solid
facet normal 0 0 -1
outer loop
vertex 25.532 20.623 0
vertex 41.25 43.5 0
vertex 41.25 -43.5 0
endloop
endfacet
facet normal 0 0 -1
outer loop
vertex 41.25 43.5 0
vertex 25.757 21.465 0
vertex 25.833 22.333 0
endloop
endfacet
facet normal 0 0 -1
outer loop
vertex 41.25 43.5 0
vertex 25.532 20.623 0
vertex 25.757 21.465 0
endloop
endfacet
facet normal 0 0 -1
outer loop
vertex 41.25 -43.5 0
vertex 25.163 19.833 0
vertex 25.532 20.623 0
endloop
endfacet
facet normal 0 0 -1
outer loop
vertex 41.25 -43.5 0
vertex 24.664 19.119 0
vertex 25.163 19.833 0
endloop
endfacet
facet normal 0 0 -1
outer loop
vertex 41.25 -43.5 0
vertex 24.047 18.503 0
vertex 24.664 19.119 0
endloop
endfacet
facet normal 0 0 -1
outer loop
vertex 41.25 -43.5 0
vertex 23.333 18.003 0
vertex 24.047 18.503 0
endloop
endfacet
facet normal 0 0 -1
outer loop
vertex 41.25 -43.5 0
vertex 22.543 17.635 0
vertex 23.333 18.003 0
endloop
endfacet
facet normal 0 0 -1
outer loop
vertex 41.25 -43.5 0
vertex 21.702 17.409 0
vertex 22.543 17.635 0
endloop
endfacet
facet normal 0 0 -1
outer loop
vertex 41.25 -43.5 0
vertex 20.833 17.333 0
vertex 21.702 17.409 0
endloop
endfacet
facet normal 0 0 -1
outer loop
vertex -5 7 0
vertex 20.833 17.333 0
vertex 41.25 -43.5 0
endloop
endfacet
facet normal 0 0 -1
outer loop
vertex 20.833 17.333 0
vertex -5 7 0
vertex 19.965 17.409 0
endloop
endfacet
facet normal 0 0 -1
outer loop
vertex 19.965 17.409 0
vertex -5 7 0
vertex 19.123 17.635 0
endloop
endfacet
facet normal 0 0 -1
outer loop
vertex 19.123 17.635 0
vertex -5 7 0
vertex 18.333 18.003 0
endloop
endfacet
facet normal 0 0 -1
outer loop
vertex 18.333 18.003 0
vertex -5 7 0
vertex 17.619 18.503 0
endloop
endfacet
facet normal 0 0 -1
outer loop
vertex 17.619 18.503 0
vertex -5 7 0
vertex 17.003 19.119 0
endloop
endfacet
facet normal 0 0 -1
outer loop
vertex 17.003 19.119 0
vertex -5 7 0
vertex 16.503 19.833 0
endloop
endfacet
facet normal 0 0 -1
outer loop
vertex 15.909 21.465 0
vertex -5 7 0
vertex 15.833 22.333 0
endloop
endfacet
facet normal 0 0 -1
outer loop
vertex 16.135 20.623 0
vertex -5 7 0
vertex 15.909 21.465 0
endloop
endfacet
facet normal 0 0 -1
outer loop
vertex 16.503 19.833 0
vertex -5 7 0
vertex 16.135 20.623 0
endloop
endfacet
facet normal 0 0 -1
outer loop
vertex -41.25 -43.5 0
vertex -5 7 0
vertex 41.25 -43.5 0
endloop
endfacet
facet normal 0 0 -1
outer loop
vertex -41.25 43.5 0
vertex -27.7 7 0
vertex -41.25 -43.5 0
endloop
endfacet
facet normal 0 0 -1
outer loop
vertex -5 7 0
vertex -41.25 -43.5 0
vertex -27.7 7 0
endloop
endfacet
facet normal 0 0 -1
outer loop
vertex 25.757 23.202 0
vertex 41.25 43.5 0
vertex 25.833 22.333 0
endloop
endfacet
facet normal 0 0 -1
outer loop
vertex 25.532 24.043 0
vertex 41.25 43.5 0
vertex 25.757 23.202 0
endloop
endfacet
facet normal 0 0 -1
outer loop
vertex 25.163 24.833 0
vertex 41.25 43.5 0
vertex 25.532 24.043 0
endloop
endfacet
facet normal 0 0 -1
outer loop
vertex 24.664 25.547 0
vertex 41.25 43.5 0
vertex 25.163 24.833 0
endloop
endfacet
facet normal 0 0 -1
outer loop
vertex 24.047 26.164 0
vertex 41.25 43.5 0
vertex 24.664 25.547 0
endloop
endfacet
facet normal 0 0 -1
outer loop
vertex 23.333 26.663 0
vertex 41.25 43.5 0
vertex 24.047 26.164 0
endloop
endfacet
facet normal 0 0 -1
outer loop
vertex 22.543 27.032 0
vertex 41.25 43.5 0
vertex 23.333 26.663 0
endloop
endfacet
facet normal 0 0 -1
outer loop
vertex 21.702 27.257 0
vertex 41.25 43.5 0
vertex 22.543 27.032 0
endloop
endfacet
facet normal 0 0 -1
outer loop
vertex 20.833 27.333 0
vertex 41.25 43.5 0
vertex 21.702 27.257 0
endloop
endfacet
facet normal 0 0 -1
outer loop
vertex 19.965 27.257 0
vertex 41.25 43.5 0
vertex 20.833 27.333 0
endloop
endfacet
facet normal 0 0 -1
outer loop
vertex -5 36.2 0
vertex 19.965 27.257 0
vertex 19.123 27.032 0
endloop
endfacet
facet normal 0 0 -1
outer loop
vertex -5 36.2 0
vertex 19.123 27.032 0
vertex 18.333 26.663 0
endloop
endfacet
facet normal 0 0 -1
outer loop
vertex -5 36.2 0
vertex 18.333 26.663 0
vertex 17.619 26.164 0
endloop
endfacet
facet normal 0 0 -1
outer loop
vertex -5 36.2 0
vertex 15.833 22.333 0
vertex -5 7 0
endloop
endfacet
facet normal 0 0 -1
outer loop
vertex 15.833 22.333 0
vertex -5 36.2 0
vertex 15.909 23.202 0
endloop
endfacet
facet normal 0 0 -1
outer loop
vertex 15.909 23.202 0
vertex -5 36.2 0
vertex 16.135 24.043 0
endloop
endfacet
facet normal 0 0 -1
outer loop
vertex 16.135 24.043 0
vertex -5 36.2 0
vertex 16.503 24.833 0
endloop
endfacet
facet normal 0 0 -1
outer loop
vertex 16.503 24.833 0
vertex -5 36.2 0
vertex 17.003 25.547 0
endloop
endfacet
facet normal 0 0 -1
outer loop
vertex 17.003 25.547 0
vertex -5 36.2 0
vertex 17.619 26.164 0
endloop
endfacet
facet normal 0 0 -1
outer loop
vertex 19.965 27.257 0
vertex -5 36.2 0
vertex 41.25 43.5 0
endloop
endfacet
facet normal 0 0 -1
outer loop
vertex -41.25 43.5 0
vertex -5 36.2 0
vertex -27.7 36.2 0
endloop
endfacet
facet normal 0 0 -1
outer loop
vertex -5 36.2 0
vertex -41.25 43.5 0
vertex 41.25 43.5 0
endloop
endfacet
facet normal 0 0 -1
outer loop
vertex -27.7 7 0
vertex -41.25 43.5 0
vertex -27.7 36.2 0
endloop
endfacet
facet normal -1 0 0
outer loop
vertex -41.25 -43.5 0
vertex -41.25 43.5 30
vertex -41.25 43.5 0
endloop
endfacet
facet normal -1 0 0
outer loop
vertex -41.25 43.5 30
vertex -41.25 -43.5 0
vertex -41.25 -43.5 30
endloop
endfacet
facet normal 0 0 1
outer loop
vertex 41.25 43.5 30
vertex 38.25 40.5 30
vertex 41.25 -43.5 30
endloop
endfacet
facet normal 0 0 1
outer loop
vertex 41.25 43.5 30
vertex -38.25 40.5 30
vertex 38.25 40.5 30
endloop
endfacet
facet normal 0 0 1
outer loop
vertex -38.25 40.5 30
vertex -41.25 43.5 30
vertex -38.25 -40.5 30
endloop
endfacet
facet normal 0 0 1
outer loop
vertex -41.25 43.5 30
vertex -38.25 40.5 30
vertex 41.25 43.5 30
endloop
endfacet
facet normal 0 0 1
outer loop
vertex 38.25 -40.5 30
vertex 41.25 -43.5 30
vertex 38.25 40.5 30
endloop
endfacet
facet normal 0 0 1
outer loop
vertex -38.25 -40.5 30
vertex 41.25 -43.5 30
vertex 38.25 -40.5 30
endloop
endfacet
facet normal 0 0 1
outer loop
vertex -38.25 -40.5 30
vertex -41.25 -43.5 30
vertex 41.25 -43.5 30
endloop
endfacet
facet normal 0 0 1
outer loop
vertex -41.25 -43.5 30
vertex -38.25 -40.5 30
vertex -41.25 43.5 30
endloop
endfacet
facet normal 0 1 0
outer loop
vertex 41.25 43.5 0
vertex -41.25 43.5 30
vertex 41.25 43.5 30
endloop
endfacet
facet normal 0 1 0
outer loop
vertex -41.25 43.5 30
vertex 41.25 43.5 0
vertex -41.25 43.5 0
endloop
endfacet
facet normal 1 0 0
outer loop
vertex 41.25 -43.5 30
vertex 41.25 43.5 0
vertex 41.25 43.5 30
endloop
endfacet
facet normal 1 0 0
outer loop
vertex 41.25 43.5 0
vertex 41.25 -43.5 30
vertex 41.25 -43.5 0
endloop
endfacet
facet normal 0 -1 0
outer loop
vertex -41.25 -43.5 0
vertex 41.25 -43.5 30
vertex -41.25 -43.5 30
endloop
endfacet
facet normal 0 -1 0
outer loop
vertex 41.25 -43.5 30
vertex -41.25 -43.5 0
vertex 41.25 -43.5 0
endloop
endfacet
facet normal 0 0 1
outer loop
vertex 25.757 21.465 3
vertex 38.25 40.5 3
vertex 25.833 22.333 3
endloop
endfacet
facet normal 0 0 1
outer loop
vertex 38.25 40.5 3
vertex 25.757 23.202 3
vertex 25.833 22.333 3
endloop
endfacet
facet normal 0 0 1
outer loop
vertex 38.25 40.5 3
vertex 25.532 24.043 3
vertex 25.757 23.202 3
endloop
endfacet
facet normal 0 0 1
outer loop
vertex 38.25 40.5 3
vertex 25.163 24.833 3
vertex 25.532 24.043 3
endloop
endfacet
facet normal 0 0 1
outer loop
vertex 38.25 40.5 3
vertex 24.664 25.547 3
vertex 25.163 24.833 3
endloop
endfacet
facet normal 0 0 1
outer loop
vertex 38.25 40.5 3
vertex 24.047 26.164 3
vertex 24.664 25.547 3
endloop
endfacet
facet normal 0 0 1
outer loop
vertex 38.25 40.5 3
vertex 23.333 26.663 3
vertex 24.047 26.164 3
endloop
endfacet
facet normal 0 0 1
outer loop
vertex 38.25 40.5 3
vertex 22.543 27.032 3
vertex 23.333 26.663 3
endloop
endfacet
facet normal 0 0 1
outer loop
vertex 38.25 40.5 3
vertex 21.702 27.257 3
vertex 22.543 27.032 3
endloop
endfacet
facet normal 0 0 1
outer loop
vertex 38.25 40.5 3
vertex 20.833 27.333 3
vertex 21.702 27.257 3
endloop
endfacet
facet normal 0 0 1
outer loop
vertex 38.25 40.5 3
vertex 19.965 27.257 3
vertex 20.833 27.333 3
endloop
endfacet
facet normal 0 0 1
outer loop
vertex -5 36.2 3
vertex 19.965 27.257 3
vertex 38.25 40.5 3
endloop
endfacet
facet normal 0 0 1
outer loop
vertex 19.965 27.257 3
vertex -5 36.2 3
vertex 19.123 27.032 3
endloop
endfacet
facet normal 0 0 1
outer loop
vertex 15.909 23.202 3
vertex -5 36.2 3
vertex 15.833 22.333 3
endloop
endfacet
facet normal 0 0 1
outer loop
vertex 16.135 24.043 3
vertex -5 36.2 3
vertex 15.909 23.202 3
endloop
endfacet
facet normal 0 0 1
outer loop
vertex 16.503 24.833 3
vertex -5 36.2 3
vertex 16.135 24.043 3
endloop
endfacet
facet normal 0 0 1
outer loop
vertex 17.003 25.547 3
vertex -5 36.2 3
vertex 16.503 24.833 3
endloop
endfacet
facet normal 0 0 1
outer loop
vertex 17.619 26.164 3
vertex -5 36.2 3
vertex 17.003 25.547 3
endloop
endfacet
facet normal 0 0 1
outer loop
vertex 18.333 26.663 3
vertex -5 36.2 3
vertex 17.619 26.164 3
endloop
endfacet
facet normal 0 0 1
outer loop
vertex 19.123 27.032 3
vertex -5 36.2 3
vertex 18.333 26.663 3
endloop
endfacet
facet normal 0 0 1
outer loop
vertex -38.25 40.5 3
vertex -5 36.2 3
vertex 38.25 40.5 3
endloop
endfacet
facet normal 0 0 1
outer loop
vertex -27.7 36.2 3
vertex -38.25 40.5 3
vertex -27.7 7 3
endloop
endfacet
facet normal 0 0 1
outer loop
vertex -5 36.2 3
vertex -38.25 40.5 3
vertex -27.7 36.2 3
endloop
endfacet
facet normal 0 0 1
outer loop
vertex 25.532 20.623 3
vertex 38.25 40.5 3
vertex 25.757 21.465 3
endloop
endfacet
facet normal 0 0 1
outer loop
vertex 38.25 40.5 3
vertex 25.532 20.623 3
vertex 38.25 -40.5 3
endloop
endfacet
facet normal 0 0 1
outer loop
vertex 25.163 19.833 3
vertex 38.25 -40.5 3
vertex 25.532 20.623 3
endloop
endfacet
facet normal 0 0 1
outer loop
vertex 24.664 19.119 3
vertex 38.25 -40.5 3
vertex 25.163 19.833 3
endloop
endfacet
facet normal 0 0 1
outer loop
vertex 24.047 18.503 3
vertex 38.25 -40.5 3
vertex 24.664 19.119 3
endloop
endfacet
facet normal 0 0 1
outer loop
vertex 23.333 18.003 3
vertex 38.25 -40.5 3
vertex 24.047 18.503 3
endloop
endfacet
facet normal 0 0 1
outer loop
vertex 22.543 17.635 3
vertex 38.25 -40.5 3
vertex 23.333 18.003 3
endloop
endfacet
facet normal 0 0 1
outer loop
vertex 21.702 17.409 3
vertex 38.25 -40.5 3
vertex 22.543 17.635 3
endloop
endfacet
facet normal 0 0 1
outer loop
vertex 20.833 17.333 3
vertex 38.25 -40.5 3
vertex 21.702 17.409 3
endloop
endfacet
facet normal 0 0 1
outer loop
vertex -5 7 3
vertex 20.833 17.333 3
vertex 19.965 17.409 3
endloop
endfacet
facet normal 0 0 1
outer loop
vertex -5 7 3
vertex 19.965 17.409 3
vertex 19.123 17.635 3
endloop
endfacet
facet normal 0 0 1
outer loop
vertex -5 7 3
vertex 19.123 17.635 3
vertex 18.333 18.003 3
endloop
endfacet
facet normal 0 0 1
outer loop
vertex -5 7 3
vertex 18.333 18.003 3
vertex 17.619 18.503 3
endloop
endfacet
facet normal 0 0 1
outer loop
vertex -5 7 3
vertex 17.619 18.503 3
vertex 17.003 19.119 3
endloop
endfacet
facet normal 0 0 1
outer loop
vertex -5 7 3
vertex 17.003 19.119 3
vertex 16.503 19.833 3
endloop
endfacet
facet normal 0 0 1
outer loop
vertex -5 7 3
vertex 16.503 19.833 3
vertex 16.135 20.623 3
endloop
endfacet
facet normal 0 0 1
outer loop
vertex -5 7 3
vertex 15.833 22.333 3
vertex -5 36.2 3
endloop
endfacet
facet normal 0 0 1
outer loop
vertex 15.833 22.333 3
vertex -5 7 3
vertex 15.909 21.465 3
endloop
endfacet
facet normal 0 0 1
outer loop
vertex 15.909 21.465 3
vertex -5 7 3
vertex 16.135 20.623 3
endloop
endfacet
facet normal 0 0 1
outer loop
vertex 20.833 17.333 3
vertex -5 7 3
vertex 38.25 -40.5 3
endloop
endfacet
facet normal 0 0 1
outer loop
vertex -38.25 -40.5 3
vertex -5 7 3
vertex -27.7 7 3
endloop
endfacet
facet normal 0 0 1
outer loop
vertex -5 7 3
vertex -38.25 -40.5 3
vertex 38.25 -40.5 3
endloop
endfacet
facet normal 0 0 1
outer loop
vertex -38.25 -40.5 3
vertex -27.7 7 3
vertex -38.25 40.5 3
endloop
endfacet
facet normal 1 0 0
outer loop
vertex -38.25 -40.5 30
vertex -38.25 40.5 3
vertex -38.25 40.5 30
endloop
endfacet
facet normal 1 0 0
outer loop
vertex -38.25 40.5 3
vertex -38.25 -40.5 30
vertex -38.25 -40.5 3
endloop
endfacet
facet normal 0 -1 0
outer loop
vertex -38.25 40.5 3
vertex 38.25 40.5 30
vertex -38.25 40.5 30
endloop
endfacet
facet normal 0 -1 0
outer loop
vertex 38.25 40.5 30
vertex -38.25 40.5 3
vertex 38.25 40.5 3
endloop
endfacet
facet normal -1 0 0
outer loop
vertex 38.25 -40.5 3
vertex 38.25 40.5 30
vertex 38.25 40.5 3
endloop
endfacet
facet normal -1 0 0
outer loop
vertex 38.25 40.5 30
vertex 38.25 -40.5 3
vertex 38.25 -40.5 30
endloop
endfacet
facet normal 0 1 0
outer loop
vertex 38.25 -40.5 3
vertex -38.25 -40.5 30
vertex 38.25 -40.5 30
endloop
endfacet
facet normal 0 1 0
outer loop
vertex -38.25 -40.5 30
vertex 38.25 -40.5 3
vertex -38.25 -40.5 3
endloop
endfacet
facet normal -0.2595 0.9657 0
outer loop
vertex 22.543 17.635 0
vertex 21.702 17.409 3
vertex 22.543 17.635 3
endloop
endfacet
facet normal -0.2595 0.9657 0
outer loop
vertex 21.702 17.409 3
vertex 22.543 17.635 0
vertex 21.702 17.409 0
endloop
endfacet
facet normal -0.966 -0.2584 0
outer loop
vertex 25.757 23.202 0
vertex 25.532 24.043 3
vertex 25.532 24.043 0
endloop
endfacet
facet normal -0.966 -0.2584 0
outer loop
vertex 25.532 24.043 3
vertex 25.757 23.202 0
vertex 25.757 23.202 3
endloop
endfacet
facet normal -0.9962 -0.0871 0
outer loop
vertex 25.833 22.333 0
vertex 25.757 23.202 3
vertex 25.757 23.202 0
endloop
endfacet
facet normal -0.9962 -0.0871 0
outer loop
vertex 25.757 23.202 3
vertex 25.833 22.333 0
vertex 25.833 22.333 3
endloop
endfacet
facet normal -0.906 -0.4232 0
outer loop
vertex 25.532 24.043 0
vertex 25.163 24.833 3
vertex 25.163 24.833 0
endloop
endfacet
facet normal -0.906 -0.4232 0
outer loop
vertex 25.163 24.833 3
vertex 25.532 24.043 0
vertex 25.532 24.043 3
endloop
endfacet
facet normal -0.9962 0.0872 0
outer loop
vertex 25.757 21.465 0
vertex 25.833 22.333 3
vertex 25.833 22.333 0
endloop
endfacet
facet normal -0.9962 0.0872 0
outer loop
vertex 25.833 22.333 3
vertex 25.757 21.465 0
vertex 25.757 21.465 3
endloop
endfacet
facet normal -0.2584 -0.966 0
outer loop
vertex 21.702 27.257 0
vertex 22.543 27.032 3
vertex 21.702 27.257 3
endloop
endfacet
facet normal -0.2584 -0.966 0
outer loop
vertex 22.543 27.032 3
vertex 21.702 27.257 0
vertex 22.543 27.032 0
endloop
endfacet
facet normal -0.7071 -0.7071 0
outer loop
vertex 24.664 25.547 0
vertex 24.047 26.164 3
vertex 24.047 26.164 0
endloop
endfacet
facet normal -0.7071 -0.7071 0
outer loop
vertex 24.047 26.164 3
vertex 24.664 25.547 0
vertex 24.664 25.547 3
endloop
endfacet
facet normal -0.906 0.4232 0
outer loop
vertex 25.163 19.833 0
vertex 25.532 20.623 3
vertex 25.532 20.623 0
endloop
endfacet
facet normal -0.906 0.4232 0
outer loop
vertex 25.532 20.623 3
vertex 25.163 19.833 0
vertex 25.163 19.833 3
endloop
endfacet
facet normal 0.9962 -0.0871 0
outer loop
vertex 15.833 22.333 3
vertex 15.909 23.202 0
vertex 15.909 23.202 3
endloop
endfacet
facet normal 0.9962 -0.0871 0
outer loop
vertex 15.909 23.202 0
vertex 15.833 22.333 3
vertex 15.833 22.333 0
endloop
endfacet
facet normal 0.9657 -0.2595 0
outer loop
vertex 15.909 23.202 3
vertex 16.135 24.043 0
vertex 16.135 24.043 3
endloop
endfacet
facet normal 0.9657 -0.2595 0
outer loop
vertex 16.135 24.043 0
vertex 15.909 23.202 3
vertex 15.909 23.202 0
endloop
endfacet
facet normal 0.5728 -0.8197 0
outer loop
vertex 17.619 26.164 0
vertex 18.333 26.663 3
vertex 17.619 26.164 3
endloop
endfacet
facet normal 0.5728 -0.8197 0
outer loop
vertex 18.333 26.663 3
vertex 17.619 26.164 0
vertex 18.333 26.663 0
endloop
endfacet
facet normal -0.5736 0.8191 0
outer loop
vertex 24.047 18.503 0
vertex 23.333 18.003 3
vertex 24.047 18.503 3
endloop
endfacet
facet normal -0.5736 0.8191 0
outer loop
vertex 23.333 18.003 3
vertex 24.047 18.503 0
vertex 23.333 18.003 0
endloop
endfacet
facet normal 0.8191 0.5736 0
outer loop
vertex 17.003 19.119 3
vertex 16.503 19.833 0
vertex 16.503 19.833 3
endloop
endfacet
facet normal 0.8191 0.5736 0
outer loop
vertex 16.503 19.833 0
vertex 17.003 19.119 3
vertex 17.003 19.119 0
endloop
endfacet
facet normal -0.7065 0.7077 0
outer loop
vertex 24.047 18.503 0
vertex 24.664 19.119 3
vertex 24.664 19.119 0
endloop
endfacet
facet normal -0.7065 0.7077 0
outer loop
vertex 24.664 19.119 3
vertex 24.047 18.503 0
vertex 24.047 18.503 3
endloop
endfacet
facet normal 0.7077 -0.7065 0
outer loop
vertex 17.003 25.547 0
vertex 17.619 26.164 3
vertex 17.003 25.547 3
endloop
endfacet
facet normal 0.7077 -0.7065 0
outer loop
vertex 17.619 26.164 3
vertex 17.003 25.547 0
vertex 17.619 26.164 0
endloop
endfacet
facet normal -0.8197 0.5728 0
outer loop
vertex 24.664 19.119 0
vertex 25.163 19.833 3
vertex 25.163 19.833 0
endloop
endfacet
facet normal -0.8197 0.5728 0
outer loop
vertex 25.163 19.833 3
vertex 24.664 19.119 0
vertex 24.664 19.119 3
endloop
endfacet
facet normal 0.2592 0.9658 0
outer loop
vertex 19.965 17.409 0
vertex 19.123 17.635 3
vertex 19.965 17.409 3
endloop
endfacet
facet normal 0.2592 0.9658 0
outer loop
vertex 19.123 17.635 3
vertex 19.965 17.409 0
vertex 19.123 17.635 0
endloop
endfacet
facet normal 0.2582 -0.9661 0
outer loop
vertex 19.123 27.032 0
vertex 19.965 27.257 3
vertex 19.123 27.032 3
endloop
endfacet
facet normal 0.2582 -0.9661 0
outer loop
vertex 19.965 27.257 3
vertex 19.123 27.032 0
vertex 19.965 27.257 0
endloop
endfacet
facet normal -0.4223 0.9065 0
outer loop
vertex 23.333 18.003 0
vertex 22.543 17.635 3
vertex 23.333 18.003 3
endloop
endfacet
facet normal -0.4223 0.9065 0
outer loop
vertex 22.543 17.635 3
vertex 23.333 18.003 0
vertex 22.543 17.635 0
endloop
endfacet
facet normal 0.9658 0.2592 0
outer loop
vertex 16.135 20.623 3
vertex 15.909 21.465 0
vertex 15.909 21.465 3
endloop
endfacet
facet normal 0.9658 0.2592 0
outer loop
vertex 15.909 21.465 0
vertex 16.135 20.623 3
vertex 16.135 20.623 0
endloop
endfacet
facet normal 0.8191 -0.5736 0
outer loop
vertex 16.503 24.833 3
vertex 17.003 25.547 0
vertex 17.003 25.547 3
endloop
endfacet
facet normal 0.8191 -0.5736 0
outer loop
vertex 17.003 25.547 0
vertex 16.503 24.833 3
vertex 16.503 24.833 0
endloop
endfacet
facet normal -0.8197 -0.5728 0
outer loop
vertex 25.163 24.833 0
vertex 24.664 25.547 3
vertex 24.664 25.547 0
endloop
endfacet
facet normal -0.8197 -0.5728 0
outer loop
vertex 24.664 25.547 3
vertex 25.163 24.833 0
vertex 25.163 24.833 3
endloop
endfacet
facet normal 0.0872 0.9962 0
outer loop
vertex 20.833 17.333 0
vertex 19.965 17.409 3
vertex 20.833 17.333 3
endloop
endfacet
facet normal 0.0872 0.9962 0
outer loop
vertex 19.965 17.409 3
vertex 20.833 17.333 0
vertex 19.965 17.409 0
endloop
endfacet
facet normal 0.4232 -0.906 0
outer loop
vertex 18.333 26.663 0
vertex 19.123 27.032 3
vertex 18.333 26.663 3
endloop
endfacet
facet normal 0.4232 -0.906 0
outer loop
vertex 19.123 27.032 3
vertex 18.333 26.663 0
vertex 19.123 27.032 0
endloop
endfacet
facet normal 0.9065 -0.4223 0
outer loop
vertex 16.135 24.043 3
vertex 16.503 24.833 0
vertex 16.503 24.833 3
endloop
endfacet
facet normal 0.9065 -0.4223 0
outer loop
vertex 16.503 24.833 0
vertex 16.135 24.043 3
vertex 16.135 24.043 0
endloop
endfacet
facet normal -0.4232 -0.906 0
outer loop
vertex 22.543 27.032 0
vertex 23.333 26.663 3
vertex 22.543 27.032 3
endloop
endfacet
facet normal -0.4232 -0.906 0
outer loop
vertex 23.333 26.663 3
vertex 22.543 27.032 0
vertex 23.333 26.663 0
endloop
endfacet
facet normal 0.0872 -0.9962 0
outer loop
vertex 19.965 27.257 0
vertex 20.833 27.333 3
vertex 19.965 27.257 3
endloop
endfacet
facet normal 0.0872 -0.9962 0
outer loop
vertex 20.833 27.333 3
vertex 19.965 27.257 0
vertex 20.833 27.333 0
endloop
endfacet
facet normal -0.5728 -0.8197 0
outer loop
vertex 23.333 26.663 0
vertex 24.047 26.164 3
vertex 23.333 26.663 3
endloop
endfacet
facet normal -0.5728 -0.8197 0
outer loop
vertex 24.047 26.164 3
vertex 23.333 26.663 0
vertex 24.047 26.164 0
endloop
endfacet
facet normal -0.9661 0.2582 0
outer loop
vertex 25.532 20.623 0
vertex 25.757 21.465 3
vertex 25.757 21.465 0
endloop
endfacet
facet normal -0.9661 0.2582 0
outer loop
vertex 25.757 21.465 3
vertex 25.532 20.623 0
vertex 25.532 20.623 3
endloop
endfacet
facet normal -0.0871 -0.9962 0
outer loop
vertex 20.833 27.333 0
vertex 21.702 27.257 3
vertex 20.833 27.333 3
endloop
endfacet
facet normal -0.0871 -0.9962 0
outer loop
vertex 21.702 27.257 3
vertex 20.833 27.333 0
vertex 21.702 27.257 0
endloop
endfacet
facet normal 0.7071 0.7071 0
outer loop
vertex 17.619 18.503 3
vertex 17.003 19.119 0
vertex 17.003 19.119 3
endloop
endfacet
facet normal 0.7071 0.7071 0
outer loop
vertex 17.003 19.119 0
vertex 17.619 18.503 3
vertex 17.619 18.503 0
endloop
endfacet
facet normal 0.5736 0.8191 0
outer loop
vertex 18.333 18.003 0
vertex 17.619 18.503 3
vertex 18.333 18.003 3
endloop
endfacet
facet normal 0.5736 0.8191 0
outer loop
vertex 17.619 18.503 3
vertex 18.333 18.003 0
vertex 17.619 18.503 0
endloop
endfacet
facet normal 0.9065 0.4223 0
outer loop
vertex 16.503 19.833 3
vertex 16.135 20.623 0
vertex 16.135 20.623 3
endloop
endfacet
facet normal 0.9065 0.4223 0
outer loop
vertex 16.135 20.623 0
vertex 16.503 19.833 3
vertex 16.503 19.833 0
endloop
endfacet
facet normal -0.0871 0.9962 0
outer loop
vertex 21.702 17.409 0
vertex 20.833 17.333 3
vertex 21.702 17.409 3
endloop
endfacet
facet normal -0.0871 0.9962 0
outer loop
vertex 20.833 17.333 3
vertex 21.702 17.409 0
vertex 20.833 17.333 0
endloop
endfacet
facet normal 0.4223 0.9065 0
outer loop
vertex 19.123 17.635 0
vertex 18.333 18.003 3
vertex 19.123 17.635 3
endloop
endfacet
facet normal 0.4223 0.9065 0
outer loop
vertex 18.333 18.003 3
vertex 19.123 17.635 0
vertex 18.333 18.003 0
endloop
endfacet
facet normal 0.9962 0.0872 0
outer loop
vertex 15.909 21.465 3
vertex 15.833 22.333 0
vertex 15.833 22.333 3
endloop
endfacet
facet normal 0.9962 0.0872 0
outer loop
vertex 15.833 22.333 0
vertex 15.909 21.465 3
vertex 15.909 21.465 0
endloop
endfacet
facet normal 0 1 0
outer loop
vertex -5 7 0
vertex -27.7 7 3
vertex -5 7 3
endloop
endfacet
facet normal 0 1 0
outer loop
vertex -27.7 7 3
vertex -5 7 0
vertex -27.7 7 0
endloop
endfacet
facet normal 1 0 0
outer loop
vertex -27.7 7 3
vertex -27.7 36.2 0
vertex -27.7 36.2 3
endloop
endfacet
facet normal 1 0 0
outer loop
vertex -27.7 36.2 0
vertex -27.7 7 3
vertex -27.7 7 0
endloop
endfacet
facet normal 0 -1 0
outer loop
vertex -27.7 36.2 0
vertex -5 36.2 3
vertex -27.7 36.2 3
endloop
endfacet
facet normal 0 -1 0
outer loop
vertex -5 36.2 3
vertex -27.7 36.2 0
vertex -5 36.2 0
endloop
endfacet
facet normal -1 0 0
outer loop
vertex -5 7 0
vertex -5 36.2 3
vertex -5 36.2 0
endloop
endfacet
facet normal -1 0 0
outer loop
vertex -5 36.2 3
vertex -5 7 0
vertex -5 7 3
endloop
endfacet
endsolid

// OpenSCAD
// file: vars.scad
echo(version=version());
//All dimensions are in mm

l = 133; // lenght of box in x dir
w = 68;  // width of box in y dir
h=32;    // height of box without lid
wall=2;  // wall thickness
postloc=28; // where the edge posts are in y direction
postsize=[1.85,3] ;  //Dimension of posts in x and y
basethickness=3;
holdslotloc=81.5;
holdslotwidth=10;
wireholddiameter = 10;
switchcutout = [29.2,22.7];
//Perforation size: 23mm*10.5mm
voltmetercutout=[24,11.5];
// Allow for slip by making the ridge a little smaller than the box it fits into.
interference=0.8;


BatteryHeight=67;
BatteryWidth=62.5;
BatteryDepth=265;
BatteryPadding=7;
BMCThickness=10;
WiringAllowance=10;
WallThickness=3.0;
// main file
include <vars.scad>;

BoxPart1Height=10 + WiringAllowance + BMCThickness;


color("red")
   difference() {
        linear_extrude(height = BoxPart1Height )
            square([BatteryWidth+WallThickness*2+BatteryPadding*2, BatteryHeight+WallThickness*2+BatteryPadding*2
            ], center = true);
       translate ([0,0,WallThickness])
         linear_extrude(height = BoxPart1Height)
            square([BatteryWidth+BatteryPadding*2, BatteryHeight+BatteryPadding*2
            ], center = true)   ;
        translate([BatteryWidth/3,BatteryHeight/3,-0.1])
    //rotate([90,0,0])
    cylinder(h = WallThickness+.2,
            r1 = wireholddiameter/2,
            r2 = wireholddiameter/2,
            $fn = 36,
            center = false); 
       // Add the On/Off Switch Cutout
    translate([WallThickness -8 ,WallThickness +4 ,   -0.1])
    rotate([0,0,90])
       linear_extrude(height = 5)
         square(switchcutout, center = false);


    /* // this hole is for a small voltmeter translate([-w+23.5+8*wall,l/2+1,basethickness+6])
    rotate([90,0,0])
        linear_extrude(height = 5)
            square(voltmetercutout,
            center = false); */

       }
